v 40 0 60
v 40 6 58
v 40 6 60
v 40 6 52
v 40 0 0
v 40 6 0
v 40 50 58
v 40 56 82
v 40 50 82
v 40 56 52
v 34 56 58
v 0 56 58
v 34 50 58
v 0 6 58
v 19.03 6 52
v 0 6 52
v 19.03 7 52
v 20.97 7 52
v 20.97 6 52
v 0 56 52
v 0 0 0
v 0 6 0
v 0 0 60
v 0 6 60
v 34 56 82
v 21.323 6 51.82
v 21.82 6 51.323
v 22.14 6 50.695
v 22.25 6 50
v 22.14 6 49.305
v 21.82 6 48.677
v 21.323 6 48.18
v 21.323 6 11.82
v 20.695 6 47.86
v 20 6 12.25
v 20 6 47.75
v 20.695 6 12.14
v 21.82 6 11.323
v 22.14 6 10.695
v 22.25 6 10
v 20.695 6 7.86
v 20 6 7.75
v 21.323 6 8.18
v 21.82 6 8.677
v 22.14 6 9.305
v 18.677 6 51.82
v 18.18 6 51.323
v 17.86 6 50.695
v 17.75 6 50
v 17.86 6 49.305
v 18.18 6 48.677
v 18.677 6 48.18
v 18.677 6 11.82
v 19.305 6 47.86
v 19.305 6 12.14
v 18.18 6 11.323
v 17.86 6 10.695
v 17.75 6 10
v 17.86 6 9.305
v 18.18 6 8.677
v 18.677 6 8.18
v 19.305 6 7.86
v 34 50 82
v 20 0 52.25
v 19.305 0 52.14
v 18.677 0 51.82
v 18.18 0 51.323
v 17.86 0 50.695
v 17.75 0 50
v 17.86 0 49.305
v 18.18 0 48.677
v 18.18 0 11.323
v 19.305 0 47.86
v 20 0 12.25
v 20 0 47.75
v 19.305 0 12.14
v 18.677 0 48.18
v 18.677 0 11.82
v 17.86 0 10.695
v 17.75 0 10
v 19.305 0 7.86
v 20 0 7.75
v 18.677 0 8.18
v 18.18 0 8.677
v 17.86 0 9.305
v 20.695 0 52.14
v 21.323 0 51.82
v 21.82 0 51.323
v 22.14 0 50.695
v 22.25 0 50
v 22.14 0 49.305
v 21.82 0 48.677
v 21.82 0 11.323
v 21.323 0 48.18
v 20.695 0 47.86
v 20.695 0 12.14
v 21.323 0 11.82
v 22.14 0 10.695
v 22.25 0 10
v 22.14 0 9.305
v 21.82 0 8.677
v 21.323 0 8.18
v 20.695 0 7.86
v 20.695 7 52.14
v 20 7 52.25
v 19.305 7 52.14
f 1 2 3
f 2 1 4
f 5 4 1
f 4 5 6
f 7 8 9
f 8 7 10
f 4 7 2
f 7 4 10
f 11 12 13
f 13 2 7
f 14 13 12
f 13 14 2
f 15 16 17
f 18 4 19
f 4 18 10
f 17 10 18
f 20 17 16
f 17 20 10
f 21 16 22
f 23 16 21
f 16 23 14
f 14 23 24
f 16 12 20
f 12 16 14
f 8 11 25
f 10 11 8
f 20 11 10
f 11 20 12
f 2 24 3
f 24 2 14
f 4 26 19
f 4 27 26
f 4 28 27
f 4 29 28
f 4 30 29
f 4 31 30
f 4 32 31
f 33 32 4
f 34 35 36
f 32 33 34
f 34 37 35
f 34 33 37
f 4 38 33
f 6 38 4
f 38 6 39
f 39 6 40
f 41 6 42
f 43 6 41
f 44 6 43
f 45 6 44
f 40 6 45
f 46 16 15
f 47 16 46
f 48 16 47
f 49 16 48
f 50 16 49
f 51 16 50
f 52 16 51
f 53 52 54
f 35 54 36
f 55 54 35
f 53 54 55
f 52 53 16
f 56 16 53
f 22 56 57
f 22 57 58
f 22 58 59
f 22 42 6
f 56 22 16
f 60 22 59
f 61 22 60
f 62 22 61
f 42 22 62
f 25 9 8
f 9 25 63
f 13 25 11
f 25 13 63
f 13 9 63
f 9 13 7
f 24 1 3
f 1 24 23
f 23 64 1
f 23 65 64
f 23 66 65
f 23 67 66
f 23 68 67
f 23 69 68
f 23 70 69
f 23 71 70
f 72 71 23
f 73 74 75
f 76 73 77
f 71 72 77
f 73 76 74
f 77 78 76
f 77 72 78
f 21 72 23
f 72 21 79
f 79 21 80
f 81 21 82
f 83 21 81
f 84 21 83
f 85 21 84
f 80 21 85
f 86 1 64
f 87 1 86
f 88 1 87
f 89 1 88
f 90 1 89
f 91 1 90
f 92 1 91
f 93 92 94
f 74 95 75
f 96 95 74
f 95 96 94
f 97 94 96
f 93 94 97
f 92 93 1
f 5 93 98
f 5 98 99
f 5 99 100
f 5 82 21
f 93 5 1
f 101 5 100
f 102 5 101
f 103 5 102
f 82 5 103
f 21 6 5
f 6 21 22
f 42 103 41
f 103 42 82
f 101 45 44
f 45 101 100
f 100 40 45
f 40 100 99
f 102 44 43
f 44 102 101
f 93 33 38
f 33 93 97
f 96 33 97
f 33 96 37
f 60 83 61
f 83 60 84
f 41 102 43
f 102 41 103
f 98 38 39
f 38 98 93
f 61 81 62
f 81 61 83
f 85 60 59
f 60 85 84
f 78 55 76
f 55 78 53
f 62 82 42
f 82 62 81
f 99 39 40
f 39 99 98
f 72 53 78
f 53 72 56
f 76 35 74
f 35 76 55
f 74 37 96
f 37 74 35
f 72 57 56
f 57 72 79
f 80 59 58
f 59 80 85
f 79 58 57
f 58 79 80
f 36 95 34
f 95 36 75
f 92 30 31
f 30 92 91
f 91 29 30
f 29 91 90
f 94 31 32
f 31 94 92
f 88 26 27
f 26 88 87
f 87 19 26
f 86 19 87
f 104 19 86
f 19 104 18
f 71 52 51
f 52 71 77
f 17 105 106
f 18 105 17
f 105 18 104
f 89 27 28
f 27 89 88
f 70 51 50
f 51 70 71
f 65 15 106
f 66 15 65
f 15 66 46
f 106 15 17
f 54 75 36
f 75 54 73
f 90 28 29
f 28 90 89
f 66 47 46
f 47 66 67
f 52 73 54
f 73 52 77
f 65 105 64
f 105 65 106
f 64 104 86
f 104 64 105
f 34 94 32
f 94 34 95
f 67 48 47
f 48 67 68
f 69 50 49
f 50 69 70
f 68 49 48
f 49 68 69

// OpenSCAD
// Parametric Wall Hook - Minimalist
// Etsy: $4-8 each, often sold in sets of 4
// Print: 0.2mm, 4 walls, 40% infill (needs strength), no supports

HOOK_W       = 40;
HOOK_D       = 50;
HOOK_H       = 6;
HOOK_TIP_H   = 30;
BACKPLATE_H  = 60;
BACKPLATE_W  = 40;
SCREW_D      = 4.5;   // M4 screw hole
SCREW_OFFSET = 10;

module backplate() {
    hull() {
        cube([BACKPLATE_W, HOOK_H, BACKPLATE_H]);
        translate([5, 0, 5])
            cube([BACKPLATE_W - 10, HOOK_H, BACKPLATE_H - 10]);
    }
}

module hook_arm() {
    translate([BACKPLATE_W/2 - HOOK_W/2, 0, 0]) {
        // Horizontal arm
        cube([HOOK_W, HOOK_D, HOOK_H]);
        // Upward tip
        translate([HOOK_W - HOOK_H, HOOK_D - HOOK_H, 0])
            cube([HOOK_H, HOOK_H, HOOK_TIP_H]);
    }
}

difference() {
    union() {
        backplate();
        translate([0, HOOK_H, BACKPLATE_H - HOOK_H - 2]) hook_arm();
    }
    // Screw holes
    for (z = [SCREW_OFFSET, BACKPLATE_H - SCREW_OFFSET])
        translate([BACKPLATE_W/2, -1, z])
            rotate([-90, 0, 0])
                cylinder(d = SCREW_D, h = HOOK_H + 2, $fn = 20);
}
